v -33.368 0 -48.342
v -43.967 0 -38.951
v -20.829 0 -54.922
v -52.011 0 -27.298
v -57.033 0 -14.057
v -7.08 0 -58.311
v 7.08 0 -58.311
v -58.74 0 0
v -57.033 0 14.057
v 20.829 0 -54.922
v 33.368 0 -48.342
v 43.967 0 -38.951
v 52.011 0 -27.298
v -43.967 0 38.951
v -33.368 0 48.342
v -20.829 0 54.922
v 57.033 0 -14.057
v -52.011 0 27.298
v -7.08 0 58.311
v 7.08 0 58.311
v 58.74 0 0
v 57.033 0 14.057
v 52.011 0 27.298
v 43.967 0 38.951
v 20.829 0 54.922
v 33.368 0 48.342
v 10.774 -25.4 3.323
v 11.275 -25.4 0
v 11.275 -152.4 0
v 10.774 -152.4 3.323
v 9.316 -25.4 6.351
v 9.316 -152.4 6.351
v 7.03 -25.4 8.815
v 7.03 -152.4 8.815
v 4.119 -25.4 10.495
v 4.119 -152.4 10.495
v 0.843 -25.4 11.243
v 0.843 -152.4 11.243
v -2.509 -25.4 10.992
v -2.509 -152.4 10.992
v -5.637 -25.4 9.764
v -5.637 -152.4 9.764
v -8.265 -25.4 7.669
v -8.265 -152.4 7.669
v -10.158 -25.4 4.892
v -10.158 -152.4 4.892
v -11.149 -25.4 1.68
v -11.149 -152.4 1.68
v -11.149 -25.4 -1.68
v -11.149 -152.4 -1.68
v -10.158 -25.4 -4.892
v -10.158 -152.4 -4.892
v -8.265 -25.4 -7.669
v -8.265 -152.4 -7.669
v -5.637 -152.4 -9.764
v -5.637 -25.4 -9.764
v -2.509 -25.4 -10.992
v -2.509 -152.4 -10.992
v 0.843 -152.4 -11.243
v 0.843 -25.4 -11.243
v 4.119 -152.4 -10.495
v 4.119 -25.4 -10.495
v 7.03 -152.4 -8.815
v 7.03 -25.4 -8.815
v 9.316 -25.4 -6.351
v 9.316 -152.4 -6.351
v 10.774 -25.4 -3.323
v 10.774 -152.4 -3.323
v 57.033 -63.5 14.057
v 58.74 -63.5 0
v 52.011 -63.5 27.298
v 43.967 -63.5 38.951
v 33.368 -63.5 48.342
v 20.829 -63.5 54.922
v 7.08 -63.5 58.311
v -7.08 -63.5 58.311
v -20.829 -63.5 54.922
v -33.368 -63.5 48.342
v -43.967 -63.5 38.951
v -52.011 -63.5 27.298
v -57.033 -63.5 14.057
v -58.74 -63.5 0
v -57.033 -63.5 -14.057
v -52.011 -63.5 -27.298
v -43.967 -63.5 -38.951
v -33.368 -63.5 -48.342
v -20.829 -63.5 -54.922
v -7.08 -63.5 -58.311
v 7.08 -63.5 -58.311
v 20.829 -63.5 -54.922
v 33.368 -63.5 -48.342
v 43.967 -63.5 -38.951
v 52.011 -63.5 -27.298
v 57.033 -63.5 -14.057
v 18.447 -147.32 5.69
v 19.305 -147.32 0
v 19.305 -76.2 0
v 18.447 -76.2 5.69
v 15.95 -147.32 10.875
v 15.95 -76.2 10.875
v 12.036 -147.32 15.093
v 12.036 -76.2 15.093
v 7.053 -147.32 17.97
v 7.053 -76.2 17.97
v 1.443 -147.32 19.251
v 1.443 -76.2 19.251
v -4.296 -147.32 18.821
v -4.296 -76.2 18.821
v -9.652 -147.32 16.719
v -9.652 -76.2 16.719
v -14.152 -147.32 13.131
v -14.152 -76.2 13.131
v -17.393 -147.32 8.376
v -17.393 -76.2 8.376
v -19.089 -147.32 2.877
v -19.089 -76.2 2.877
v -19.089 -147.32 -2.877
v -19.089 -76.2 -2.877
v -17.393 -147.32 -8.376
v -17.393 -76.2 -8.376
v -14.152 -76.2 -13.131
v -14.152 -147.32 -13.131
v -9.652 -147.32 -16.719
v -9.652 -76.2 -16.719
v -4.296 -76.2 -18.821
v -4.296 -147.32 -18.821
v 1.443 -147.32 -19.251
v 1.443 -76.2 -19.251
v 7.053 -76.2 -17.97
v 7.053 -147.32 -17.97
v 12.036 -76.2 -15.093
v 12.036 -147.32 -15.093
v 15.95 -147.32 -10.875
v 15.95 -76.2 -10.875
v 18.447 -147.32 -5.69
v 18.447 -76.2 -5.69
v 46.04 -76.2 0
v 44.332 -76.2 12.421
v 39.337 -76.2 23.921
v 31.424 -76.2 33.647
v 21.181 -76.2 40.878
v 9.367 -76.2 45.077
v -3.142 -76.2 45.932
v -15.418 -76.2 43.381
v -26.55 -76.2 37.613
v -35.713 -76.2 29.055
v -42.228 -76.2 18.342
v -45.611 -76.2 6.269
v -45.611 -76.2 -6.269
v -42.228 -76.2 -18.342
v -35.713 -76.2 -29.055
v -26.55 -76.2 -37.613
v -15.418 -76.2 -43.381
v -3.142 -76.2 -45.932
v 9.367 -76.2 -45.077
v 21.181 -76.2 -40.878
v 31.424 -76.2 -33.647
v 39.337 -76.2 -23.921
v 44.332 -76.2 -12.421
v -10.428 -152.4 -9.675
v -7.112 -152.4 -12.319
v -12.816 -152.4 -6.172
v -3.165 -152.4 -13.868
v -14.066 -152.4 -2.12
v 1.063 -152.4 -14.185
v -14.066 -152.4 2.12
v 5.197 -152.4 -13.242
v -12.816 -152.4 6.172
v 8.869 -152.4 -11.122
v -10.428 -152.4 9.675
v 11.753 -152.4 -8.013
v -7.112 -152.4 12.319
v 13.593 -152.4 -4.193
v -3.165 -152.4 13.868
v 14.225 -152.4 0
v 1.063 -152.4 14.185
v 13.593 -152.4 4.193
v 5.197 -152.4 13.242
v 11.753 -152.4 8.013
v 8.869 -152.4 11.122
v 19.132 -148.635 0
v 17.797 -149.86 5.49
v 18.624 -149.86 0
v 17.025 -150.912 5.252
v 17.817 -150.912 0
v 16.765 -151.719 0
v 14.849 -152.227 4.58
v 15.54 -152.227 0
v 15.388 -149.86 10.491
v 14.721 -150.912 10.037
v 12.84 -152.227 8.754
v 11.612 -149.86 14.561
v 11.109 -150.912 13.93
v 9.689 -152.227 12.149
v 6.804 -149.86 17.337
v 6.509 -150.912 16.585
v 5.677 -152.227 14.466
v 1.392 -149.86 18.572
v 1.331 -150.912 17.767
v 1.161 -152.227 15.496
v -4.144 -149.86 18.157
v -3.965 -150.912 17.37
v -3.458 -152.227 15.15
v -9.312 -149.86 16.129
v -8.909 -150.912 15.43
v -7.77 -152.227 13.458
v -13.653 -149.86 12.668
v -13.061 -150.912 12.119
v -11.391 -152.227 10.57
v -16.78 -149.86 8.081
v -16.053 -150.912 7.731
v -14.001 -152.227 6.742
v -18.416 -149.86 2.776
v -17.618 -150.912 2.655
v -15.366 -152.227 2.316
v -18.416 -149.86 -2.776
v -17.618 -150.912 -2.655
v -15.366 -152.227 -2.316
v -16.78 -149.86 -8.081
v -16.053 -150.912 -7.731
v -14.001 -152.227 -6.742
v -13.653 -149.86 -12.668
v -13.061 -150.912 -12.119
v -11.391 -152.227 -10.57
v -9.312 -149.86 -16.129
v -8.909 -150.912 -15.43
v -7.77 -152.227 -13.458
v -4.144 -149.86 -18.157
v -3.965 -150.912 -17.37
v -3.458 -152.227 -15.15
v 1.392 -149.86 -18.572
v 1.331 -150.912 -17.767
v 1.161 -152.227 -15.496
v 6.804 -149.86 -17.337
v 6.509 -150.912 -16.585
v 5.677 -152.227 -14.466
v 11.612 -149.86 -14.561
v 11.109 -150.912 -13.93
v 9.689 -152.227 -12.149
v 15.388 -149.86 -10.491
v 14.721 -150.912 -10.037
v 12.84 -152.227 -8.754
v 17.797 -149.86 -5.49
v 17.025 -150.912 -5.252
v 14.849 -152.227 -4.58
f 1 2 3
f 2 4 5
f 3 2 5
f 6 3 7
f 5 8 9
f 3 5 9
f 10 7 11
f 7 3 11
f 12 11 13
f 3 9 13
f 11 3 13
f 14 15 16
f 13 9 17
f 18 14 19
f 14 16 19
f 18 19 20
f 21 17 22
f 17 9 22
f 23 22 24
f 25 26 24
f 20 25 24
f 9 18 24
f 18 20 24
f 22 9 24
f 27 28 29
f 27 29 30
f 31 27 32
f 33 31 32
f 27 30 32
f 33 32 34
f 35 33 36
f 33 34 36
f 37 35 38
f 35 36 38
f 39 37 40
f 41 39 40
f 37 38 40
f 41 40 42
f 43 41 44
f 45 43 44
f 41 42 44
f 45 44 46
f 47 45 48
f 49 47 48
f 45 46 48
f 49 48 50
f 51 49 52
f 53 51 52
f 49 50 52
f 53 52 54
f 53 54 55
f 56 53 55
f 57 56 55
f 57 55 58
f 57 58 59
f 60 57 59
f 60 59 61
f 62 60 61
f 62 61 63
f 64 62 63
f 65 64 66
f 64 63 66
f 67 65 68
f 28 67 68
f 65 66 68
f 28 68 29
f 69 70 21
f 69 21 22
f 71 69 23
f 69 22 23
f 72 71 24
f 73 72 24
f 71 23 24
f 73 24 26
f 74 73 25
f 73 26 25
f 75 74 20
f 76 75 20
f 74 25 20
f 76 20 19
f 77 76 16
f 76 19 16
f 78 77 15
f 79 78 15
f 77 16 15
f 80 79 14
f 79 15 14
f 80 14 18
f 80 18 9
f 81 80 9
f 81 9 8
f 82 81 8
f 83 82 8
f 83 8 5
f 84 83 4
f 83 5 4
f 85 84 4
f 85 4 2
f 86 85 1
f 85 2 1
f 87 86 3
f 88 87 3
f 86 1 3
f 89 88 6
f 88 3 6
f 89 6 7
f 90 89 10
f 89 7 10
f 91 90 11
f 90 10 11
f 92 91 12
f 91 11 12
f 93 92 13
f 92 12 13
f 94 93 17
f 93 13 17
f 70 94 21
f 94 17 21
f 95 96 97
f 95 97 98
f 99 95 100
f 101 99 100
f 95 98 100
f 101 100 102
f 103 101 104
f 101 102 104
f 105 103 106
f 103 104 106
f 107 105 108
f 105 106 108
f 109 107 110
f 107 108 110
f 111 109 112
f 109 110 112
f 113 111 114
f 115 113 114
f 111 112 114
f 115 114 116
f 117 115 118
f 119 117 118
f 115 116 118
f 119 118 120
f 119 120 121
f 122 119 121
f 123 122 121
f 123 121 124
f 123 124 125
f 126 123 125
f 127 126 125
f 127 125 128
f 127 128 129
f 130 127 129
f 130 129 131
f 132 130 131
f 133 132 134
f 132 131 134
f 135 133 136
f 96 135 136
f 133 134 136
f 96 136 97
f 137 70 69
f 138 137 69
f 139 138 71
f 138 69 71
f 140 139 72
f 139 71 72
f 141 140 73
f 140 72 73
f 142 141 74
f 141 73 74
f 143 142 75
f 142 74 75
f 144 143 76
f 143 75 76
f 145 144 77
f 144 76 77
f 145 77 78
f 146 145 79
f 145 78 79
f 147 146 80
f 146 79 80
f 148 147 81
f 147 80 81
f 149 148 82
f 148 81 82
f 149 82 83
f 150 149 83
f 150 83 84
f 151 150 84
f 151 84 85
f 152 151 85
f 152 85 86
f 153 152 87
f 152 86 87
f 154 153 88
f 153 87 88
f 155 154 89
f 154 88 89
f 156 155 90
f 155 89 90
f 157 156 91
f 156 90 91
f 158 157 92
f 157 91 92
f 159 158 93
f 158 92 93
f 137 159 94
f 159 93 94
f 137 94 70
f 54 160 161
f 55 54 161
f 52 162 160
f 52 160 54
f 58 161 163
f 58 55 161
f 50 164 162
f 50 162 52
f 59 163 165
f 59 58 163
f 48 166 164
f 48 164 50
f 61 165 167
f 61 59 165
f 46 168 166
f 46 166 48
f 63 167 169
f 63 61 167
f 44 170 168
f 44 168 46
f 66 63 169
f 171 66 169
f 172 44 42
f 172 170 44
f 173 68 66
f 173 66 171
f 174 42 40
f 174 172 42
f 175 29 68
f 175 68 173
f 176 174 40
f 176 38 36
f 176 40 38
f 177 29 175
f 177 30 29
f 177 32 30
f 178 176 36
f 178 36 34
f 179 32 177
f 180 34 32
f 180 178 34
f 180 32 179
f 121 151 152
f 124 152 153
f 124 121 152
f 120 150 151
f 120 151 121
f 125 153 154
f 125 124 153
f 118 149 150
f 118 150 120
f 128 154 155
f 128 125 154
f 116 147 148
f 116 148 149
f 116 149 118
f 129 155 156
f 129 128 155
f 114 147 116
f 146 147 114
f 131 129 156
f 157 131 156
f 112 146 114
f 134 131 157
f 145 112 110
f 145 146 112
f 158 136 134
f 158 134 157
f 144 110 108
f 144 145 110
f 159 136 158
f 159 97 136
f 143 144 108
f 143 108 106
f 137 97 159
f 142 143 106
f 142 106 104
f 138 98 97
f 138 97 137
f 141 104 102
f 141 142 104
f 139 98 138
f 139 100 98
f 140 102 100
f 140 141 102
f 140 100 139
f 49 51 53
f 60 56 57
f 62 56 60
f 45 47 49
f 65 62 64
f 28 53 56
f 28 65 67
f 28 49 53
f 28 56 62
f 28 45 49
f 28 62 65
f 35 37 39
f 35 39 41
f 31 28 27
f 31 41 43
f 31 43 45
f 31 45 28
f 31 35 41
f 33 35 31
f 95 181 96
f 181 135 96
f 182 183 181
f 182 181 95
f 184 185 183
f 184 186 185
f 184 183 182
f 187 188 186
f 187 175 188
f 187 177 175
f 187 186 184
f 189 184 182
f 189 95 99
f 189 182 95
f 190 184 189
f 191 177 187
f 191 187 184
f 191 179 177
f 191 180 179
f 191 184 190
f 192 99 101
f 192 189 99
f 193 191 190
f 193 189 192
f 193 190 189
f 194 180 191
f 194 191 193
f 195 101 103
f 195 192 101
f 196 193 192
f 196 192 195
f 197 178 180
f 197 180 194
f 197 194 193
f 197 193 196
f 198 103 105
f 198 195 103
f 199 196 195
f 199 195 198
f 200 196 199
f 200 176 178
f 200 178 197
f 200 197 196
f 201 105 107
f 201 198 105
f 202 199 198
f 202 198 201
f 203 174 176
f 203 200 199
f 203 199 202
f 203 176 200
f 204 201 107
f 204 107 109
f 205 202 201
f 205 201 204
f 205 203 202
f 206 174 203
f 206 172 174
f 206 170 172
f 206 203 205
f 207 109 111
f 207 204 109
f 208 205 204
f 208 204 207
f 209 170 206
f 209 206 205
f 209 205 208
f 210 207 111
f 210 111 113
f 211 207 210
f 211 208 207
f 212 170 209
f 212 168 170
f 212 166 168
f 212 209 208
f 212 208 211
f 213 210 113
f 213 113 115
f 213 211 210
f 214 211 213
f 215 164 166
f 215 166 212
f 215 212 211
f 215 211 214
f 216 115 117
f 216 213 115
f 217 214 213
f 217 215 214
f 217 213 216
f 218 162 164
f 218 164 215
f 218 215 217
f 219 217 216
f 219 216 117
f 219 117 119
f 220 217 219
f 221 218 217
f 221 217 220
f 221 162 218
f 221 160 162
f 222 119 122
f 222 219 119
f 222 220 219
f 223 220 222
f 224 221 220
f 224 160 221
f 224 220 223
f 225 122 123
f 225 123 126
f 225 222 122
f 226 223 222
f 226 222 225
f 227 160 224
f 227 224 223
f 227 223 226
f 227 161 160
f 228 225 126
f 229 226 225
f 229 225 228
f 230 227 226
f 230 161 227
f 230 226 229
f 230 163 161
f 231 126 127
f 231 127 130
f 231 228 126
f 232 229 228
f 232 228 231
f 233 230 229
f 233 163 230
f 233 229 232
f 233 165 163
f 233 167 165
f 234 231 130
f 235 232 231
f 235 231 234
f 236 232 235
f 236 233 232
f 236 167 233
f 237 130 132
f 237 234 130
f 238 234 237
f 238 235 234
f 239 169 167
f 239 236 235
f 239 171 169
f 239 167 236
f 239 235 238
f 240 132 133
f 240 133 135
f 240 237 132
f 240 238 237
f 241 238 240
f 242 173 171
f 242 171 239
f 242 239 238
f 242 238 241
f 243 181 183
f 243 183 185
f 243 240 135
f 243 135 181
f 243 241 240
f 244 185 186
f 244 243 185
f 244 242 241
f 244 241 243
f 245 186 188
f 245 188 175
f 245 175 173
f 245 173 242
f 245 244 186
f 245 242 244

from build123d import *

# Parameters (mm, degrees)
F0_R      = 58.7395
F2_DEPTH  = 76.2
F3_R      = 19.30494
F4_DEPTH  = 76.2
F6_R      = 9.692855
F7_DEPTH  = 76.2
F5_R      = 9.656386
F8_DEPTH  = 127
F9_R      = 11.274603
F10_DEPTH = 127
F11_R     = 5.08
F12_SIZE  = 12.7


with BuildPart() as f2:
    # F0 (on Front) → F2 (new body)
    with BuildSketch(Plane.XZ):
        Circle(F0_R)
    extrude(amount=F2_DEPTH)

    # F3 (on face) → F4 (join)
    with BuildSketch(Plane.XZ.offset(76.2)):
        Circle(F3_R)
    extrude(amount=F4_DEPTH)

    # F6 (on Front) → F7 (cut)
    with BuildSketch(Plane.XZ):
        Circle(F6_R)
    extrude(amount=-F7_DEPTH, mode=Mode.SUBTRACT)

    # F5 (on Front) → F8 (cut)
    with BuildSketch(Plane.XZ):
        Circle(F5_R)
    extrude(amount=-F8_DEPTH, mode=Mode.SUBTRACT)

    # F9 (on face) → F10 (cut)
    with BuildSketch(Plane.XZ.offset(152.4)):
        Circle(F9_R)
    extrude(amount=-F10_DEPTH, mode=Mode.SUBTRACT)

    # F11
    f11_edges = [f2.edges().sort_by_distance(p)[0] for p in [
        (-19.30494, -152.4, 0),
    ]]
    fillet(f11_edges, radius=F11_R)

    # F12
    f12_edges = [f2.edges().sort_by_distance(p)[0] for p in [
        (-58.7395, -76.2, 0),
    ]]
    chamfer(f12_edges, length=F12_SIZE)


solid = f2.part
